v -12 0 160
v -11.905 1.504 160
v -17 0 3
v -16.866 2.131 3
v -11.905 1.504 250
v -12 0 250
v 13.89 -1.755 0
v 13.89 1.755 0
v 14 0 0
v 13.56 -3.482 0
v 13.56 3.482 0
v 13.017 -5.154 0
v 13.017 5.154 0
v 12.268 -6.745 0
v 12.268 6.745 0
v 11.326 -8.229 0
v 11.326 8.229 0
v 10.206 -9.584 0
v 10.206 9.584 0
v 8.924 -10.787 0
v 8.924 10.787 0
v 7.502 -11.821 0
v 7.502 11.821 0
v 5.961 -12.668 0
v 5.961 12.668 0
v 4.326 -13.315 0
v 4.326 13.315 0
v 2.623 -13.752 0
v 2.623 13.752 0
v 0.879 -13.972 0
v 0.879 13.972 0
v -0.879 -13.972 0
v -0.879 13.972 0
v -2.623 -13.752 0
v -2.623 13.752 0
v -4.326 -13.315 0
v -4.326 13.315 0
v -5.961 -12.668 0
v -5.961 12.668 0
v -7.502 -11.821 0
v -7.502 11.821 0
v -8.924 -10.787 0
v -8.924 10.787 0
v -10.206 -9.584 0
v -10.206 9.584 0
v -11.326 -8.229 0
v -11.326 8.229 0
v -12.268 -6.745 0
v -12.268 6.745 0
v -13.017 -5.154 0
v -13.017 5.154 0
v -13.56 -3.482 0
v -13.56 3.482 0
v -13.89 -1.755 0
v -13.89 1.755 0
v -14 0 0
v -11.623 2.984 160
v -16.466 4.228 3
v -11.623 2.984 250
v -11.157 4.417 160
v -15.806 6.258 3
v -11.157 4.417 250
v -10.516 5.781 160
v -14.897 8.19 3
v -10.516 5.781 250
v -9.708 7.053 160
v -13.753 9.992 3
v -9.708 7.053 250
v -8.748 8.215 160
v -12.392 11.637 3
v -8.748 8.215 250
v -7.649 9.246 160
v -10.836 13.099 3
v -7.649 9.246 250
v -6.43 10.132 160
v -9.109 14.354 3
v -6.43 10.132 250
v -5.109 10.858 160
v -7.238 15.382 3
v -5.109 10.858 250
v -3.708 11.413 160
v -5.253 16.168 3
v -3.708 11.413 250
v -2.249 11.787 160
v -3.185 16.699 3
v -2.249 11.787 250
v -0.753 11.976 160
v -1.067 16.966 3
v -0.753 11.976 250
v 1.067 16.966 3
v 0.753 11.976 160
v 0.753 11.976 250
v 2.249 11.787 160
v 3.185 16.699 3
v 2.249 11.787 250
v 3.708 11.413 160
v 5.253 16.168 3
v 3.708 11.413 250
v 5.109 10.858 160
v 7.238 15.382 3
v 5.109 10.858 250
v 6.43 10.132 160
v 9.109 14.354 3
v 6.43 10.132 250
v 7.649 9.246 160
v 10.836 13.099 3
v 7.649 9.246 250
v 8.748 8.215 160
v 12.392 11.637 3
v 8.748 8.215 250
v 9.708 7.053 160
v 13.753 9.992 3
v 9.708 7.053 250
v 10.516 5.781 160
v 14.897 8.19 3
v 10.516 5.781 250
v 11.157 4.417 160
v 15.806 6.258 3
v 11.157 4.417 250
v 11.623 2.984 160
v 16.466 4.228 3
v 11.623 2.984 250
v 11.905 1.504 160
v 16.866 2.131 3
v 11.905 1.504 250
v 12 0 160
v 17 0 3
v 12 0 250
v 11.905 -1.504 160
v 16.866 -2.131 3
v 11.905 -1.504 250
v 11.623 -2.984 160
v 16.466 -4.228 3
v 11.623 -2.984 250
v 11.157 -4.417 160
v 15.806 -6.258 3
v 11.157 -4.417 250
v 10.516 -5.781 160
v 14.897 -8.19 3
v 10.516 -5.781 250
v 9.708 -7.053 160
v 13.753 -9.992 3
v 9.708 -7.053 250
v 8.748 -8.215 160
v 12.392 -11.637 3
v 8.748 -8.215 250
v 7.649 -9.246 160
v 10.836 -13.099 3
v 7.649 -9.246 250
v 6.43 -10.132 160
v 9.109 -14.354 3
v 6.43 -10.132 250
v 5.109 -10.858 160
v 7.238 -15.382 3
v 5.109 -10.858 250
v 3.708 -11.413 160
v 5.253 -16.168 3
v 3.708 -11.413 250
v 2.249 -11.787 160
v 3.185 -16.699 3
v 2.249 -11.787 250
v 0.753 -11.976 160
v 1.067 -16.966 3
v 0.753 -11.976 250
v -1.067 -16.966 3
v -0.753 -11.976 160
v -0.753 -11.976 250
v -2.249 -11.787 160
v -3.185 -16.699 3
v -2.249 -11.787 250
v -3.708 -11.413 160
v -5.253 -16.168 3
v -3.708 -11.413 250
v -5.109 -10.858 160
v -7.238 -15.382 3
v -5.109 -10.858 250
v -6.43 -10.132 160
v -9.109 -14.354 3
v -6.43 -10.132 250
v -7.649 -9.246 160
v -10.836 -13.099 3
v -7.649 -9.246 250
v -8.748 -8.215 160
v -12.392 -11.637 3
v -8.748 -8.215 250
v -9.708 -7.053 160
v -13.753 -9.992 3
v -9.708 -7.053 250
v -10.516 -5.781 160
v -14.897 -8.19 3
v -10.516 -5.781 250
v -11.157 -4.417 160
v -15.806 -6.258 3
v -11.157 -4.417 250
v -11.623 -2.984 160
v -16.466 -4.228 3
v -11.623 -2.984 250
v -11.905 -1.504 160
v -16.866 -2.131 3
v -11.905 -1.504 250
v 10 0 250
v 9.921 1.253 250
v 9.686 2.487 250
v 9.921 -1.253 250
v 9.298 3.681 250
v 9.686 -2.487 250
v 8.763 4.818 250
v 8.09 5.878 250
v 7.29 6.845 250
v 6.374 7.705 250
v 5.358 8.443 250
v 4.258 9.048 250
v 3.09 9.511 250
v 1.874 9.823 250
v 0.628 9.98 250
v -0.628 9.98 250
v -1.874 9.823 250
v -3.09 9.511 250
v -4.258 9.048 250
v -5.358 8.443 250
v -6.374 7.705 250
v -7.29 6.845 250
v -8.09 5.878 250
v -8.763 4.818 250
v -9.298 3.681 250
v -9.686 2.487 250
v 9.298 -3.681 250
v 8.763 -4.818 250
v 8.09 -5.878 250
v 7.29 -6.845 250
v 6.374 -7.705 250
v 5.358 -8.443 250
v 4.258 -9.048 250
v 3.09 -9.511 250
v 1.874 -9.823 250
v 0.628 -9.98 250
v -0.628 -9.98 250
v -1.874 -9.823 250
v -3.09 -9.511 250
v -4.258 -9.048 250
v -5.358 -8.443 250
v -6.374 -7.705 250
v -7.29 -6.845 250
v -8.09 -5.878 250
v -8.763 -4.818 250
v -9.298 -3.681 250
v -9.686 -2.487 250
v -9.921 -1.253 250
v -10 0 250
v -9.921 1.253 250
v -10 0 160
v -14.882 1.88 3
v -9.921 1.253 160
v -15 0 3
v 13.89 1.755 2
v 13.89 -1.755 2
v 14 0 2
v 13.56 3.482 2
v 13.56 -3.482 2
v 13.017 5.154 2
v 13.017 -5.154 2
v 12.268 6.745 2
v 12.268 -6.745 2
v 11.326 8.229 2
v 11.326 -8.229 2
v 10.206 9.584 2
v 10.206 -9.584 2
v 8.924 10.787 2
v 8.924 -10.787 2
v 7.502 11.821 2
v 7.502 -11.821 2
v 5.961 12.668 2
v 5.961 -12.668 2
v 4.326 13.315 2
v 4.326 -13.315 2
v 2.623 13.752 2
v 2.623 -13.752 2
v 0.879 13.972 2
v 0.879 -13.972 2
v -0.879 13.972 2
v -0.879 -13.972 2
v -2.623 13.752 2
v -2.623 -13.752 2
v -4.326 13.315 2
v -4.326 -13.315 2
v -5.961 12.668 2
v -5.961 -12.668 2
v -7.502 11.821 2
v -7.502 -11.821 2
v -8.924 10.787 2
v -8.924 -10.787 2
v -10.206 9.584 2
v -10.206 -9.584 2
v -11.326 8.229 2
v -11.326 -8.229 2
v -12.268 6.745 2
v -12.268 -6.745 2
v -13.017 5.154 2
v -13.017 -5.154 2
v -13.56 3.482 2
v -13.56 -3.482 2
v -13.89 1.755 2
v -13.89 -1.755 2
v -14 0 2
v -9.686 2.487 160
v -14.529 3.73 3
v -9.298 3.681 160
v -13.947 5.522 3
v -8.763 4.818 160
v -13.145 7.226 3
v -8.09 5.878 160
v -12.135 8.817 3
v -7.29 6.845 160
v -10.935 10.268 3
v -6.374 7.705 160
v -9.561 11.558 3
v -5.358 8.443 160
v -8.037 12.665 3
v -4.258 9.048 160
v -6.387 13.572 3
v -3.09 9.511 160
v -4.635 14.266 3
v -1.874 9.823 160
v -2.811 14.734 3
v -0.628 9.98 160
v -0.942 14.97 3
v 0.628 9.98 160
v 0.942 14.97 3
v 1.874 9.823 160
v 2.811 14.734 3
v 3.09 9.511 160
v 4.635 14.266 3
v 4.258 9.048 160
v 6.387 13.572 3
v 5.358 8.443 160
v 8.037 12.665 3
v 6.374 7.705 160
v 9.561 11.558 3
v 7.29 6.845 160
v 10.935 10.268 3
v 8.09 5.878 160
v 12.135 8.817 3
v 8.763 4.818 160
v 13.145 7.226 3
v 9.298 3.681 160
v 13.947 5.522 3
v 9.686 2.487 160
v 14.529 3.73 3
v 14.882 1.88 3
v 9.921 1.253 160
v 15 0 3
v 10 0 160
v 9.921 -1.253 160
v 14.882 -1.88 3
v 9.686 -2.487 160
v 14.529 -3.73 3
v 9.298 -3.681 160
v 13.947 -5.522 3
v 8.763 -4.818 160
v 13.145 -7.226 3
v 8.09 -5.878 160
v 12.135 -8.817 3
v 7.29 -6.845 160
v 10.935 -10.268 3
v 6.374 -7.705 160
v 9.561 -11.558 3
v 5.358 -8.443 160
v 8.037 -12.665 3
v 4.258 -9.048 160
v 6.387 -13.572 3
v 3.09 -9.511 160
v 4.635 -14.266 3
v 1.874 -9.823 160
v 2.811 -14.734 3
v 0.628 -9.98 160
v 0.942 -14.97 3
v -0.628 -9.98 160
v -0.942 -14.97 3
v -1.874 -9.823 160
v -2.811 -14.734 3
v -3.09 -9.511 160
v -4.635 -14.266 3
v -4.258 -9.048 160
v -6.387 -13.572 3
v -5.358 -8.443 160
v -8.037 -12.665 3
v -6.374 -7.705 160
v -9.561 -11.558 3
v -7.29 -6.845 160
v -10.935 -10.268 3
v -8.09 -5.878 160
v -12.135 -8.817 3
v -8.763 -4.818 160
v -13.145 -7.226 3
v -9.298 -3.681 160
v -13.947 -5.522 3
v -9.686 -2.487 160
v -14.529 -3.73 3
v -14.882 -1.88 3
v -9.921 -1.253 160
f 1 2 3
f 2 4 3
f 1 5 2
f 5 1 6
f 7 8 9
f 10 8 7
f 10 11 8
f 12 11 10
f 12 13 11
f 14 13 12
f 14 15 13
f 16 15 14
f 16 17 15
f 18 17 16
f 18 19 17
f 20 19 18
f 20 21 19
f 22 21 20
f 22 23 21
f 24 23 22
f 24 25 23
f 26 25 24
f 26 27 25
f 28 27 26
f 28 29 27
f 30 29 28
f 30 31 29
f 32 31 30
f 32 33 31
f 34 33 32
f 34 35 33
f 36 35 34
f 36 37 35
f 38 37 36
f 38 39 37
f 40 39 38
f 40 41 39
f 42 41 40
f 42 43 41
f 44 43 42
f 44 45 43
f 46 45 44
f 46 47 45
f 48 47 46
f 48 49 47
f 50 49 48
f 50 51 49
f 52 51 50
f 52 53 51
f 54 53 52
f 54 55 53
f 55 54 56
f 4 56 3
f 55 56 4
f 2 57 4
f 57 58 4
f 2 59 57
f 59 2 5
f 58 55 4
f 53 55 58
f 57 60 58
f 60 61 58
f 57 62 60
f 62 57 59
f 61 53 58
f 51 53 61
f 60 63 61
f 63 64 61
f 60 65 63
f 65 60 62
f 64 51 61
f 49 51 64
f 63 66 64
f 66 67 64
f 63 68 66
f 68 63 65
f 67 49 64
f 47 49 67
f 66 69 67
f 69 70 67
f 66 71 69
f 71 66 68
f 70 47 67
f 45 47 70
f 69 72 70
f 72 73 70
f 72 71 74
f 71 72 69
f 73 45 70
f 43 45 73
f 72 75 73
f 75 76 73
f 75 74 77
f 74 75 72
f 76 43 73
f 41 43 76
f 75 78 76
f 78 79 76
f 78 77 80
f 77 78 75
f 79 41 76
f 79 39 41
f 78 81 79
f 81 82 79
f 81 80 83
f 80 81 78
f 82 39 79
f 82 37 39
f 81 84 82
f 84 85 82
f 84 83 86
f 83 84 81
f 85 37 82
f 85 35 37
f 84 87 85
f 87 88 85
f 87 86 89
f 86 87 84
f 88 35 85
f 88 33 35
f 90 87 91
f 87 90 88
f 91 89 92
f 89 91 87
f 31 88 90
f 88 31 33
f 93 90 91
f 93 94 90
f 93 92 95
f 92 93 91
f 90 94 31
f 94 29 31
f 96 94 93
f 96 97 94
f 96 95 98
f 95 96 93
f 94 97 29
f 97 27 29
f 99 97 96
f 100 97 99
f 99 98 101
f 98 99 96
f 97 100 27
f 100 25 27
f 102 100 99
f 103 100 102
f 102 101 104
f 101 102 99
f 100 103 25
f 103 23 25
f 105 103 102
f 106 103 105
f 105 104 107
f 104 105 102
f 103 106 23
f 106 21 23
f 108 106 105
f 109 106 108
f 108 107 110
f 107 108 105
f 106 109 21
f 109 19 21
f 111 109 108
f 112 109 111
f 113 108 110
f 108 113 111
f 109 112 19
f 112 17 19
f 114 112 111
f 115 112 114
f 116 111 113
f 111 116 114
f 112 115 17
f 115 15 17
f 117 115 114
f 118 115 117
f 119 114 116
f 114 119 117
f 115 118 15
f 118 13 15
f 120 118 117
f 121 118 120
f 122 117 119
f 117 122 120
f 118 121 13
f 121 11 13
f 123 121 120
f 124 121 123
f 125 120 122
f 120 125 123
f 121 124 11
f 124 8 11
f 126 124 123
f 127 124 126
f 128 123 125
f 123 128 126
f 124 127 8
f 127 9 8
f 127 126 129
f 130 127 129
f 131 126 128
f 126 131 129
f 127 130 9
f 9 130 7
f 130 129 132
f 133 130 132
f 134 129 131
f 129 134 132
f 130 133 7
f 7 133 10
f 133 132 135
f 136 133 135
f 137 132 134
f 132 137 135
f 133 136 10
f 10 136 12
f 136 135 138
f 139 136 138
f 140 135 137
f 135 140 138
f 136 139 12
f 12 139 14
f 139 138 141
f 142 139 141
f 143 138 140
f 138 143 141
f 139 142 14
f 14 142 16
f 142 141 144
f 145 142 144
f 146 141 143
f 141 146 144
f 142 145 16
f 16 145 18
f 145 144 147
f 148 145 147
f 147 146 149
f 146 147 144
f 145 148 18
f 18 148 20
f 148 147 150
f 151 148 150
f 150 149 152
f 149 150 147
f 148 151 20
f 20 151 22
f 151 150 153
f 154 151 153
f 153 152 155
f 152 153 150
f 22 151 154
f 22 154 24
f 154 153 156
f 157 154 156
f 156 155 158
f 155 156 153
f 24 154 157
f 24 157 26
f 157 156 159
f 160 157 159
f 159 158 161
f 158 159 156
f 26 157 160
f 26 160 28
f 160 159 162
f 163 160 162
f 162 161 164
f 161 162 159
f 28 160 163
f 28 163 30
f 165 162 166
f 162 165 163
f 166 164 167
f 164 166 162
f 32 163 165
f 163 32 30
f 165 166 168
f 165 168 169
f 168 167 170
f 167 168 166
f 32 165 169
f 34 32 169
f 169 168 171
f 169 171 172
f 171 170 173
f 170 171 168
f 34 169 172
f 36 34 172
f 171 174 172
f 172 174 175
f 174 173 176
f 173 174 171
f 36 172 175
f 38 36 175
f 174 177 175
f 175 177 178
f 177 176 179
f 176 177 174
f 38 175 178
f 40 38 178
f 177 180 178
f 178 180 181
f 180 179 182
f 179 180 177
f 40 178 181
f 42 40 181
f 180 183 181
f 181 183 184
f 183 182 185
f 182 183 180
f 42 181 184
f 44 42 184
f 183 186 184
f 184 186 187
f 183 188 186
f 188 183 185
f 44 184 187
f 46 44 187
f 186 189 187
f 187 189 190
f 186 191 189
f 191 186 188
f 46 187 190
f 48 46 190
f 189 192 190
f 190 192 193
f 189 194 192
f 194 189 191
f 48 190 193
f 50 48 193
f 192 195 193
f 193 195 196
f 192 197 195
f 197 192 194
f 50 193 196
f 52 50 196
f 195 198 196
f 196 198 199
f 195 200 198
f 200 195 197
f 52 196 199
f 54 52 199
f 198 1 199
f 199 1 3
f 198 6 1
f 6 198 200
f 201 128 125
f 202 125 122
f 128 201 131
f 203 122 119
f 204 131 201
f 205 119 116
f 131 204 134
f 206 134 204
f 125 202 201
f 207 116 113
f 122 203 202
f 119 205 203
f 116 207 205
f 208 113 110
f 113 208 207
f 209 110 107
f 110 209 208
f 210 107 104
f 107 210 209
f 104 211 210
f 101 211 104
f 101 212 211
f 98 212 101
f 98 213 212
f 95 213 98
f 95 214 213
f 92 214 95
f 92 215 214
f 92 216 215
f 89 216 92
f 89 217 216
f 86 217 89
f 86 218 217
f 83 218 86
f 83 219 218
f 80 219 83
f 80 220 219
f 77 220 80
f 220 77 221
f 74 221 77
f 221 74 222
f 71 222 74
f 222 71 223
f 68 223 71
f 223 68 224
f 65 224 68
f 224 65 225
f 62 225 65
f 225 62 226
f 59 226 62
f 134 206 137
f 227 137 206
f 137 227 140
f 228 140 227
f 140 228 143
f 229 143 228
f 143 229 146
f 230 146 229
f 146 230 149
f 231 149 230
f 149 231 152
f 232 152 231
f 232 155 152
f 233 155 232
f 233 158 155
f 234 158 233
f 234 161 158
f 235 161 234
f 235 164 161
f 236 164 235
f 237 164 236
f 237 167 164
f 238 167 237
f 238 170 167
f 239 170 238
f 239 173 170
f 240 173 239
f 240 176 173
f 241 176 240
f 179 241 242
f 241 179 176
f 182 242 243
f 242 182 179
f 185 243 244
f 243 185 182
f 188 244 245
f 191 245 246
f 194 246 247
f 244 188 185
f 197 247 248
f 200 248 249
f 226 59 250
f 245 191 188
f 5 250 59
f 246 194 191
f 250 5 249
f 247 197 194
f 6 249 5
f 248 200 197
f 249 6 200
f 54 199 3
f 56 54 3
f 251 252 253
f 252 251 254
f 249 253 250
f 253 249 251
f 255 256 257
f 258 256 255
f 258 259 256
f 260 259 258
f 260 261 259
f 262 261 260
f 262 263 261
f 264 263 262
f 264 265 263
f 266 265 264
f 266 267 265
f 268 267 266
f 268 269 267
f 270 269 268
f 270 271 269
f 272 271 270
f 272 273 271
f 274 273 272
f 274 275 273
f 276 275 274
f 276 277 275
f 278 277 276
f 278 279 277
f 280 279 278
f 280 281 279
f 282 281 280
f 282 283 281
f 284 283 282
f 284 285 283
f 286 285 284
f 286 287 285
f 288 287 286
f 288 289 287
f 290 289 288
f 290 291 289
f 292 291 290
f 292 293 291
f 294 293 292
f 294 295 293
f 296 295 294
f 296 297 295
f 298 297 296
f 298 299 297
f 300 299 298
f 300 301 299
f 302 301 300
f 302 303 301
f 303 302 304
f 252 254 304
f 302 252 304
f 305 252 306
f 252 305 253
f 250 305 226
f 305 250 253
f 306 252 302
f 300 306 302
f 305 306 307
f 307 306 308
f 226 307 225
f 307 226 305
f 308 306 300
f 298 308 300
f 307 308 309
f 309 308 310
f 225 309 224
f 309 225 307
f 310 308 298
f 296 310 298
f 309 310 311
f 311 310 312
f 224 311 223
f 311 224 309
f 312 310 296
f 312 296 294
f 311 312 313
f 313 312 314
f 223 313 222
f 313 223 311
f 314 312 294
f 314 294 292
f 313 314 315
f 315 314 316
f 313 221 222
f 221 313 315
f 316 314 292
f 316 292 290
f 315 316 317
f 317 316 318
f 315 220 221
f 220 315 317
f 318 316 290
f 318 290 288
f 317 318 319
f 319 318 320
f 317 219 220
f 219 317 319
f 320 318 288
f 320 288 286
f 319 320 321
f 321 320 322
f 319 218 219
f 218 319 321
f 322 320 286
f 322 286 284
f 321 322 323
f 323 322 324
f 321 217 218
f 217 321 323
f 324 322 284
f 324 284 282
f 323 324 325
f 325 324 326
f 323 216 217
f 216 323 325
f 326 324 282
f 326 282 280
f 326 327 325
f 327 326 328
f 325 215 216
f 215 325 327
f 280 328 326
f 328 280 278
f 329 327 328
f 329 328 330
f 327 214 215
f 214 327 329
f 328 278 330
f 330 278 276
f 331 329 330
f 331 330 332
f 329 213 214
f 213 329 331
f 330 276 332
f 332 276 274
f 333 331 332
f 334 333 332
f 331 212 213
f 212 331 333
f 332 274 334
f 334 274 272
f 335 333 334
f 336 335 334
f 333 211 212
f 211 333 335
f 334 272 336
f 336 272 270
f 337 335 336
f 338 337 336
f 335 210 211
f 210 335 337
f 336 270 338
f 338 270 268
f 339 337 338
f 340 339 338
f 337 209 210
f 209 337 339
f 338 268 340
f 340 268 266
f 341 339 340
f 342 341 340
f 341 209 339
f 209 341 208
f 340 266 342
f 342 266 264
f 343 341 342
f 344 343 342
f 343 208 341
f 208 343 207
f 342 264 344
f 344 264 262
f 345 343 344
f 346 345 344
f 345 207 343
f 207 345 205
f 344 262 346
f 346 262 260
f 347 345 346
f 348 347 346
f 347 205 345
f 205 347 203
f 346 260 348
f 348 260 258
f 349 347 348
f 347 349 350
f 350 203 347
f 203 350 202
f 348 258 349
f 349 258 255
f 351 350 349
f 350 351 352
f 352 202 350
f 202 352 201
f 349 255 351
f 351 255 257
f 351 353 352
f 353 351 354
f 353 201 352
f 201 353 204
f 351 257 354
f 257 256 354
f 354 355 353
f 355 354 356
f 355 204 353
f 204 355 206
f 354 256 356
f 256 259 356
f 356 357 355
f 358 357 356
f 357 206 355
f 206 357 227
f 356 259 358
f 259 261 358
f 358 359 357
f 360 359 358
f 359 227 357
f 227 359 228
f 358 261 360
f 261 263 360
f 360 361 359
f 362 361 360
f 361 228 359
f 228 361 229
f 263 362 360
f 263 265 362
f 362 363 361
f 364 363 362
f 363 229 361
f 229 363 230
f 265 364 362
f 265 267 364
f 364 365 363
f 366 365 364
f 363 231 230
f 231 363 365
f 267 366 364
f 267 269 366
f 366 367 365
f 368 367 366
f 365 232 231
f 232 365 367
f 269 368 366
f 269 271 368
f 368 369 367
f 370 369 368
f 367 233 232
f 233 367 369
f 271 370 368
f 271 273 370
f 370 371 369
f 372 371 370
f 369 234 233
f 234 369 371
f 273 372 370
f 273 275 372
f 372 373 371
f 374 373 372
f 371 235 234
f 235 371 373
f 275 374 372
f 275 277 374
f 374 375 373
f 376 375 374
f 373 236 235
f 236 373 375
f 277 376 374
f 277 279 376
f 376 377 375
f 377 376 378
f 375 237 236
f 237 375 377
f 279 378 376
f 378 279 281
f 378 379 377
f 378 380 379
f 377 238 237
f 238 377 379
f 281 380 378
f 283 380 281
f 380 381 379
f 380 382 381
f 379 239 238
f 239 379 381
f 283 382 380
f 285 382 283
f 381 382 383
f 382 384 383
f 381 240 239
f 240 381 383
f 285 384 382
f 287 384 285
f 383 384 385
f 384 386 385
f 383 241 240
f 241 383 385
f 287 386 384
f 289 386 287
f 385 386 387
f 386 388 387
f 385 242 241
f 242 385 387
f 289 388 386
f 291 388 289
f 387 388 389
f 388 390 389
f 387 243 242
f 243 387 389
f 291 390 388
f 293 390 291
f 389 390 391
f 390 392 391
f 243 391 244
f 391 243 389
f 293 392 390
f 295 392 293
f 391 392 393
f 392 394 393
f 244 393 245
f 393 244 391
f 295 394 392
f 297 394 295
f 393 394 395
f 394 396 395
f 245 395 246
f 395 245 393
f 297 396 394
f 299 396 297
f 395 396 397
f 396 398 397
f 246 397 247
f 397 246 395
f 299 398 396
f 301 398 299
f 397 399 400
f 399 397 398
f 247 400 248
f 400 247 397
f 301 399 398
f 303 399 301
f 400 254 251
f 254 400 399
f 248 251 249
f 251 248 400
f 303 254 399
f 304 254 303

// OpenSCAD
$fn = 50;

l = 250;
l2 = 90;
r1 = 17;
r2 = 12;
f = 3;
s = 2;

difference() {
rotate_extrude() polygon([[0,0],[r1-f,0],[r1,f],[r2,l-l2],[r2,l],[0,l]]);
rotate_extrude() polygon([[0,s],[r1-f,s],[r1-s,f],[r2-s,l-l2],[r2-s,l],[0,l]]);
}
